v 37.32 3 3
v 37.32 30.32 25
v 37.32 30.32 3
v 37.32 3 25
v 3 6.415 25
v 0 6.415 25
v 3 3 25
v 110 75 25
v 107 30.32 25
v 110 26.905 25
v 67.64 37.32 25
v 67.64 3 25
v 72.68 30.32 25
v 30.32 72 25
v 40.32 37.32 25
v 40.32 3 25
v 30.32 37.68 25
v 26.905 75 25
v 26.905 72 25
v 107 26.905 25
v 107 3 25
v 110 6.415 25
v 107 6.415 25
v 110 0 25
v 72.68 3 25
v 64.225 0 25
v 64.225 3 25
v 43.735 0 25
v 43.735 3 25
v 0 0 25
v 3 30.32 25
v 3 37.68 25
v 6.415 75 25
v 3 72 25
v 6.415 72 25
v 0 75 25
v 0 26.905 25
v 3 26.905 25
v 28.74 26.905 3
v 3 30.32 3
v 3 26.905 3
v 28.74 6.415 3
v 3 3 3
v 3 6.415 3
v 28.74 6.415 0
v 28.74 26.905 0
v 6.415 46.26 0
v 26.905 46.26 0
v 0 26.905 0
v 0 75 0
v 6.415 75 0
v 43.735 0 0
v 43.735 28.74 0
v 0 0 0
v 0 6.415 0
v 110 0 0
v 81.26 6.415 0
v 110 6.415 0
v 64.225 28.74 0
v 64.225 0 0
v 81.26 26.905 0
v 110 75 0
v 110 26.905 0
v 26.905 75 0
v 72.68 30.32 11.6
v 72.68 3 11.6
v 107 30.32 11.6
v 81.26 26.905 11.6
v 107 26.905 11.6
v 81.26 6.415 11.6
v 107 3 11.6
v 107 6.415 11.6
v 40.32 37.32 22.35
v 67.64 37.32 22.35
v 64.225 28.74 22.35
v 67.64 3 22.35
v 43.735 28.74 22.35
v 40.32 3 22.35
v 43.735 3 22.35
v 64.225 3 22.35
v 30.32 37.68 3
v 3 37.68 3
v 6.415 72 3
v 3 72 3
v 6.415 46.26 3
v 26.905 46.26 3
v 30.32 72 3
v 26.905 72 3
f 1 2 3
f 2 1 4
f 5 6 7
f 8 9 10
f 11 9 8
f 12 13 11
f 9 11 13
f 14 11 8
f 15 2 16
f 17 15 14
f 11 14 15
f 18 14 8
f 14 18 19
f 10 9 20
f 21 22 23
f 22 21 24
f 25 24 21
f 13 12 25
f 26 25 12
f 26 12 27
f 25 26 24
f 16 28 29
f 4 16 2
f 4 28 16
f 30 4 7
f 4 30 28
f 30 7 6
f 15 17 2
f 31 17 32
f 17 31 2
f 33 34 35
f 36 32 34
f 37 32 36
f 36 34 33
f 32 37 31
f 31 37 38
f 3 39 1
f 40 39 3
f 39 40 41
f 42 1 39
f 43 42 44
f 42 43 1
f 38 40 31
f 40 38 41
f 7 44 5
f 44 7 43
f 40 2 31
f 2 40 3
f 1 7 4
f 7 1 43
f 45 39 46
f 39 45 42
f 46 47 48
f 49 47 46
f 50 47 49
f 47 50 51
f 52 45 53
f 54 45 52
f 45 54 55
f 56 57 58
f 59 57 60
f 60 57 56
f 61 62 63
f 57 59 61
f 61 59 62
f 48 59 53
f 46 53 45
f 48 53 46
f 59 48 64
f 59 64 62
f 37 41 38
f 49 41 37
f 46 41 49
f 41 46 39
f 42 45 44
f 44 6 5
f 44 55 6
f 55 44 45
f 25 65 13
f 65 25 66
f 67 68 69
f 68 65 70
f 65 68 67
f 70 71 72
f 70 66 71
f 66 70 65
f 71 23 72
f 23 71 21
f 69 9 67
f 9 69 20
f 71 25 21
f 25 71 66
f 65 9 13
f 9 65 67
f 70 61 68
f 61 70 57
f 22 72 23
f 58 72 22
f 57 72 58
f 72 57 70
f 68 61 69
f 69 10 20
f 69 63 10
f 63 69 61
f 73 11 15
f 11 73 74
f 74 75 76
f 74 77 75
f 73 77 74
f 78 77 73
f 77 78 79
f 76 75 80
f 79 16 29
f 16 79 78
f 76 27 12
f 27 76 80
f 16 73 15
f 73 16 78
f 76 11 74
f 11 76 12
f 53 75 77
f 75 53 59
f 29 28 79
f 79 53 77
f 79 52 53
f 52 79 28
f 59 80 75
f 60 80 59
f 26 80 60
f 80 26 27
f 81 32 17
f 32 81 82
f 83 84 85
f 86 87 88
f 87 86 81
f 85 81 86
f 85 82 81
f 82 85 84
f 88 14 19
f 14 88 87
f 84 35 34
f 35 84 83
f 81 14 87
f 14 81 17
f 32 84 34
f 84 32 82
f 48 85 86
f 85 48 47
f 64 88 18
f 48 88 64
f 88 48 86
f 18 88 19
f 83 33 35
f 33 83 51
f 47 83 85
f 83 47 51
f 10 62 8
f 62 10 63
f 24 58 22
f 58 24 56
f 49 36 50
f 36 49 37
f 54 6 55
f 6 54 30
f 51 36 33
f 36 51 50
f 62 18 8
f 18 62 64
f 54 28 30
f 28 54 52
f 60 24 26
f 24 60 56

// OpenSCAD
// file: SquarePileLib.scad
module LeftPile(wallThickness, totalHeight, singlePileHeight, singlePileWidth, singlePileLength, pileCount){
    pileHeight = (pileCount * singlePileHeight) + .5;
    lengthOpeningSize = singlePileLength * .75;
    widthOpeningSize = singlePileWidth * .75;
    blockerSize = (singlePileWidth - widthOpeningSize) / 2;
    
    translate([wallThickness, wallThickness, totalHeight - pileHeight])
        cube([singlePileLength, singlePileWidth, pileHeight]);
    translate([-.00001, wallThickness + (blockerSize), 0])
        cube([wallThickness + lengthOpeningSize, widthOpeningSize, totalHeight]);
}

module RightPile(wallThickness, totalHeight, singlePileHeight, singlePileWidth, singlePileLength, pileCount){
    translate([0, wallThickness + wallThickness + singlePileWidth, 0])
        rotate([0, 0, 180])
            LeftPile(wallThickness, totalHeight, singlePileHeight, singlePileWidth, singlePileLength, pileCount);
}

module BottomPile(wallThickness, totalHeight, singlePileHeight, singlePileWidth, singlePileLength, pileCount){
    translate([wallThickness + wallThickness + singlePileWidth, 0, 0])
        rotate([0, 0, 90])
            LeftPile(wallThickness, totalHeight, singlePileHeight, singlePileWidth, singlePileLength, pileCount);
}

module TopPile(wallThickness, totalHeight, singlePileHeight, singlePileWidth, singlePileLength, pileCount){
        rotate([0, 0, 270])
            LeftPile(wallThickness, totalHeight, singlePileHeight, singlePileWidth, singlePileLength, pileCount);
}
// file: ColonistsBuildingsLib.scad
include<SquarePileLib.scad>
//25.82 by 32.82 by 2.15
singleBuildingPileHeight = 2.15;
singleBuildingPileWidth = 25.82 + 1.5;
singleBuildingPileLength = 32.82 + 1.5;

module LeftBuildingPile(wallThickness, totalHeight, buildingPileCount){
    LeftPile(
        wallThickness,
        totalHeight,
        singleBuildingPileHeight,
        singleBuildingPileWidth,
        singleBuildingPileLength,
        buildingPileCount);
}

module RightBuildingPile(wallThickness, totalHeight, buildingPileCount){
    RightPile(
        wallThickness,
        totalHeight,
        singleBuildingPileHeight,
        singleBuildingPileWidth,
        singleBuildingPileLength,
        buildingPileCount);
}

module BottomBuildingPile(wallThickness, totalHeight, buildingPileCount){
    BottomPile(
        wallThickness,
        totalHeight,
        singleBuildingPileHeight,
        singleBuildingPileWidth,
        singleBuildingPileLength,
        buildingPileCount);
}

module TopBuildingPile(wallThickness, totalHeight, buildingPileCount){
    TopPile(
        wallThickness,
        totalHeight,
        singleBuildingPileHeight,
        singleBuildingPileWidth,
        singleBuildingPileLength,
        buildingPileCount);
}

function buildingPileHeight(buildingPileCount) =
    (buildingPileCount * singleBuildingPileHeight) + .5;
// main file
include<ColonistsBuildingsLib.scad>
difference() {
    testBoxHeight = buildingPileHeight(10) + 3;
    testBoxLength = 110;
    testBoxWidth = 75;
    wallThickness = 3;
    
    cube([testBoxLength, testBoxWidth, testBoxHeight]);
    LeftBuildingPile(wallThickness, testBoxHeight, 10);
//    translate([100 - (15.05 + .8), 0, 0])
    translate([testBoxLength, 0, 0])
        RightBuildingPile(wallThickness, testBoxHeight, 6);
    translate([singleBuildingPileLength + wallThickness, 0, 0])
        BottomBuildingPile(wallThickness, testBoxHeight, 1);
    translate([0, testBoxWidth, 0])
        TopBuildingPile(wallThickness, testBoxHeight, 10);
}
